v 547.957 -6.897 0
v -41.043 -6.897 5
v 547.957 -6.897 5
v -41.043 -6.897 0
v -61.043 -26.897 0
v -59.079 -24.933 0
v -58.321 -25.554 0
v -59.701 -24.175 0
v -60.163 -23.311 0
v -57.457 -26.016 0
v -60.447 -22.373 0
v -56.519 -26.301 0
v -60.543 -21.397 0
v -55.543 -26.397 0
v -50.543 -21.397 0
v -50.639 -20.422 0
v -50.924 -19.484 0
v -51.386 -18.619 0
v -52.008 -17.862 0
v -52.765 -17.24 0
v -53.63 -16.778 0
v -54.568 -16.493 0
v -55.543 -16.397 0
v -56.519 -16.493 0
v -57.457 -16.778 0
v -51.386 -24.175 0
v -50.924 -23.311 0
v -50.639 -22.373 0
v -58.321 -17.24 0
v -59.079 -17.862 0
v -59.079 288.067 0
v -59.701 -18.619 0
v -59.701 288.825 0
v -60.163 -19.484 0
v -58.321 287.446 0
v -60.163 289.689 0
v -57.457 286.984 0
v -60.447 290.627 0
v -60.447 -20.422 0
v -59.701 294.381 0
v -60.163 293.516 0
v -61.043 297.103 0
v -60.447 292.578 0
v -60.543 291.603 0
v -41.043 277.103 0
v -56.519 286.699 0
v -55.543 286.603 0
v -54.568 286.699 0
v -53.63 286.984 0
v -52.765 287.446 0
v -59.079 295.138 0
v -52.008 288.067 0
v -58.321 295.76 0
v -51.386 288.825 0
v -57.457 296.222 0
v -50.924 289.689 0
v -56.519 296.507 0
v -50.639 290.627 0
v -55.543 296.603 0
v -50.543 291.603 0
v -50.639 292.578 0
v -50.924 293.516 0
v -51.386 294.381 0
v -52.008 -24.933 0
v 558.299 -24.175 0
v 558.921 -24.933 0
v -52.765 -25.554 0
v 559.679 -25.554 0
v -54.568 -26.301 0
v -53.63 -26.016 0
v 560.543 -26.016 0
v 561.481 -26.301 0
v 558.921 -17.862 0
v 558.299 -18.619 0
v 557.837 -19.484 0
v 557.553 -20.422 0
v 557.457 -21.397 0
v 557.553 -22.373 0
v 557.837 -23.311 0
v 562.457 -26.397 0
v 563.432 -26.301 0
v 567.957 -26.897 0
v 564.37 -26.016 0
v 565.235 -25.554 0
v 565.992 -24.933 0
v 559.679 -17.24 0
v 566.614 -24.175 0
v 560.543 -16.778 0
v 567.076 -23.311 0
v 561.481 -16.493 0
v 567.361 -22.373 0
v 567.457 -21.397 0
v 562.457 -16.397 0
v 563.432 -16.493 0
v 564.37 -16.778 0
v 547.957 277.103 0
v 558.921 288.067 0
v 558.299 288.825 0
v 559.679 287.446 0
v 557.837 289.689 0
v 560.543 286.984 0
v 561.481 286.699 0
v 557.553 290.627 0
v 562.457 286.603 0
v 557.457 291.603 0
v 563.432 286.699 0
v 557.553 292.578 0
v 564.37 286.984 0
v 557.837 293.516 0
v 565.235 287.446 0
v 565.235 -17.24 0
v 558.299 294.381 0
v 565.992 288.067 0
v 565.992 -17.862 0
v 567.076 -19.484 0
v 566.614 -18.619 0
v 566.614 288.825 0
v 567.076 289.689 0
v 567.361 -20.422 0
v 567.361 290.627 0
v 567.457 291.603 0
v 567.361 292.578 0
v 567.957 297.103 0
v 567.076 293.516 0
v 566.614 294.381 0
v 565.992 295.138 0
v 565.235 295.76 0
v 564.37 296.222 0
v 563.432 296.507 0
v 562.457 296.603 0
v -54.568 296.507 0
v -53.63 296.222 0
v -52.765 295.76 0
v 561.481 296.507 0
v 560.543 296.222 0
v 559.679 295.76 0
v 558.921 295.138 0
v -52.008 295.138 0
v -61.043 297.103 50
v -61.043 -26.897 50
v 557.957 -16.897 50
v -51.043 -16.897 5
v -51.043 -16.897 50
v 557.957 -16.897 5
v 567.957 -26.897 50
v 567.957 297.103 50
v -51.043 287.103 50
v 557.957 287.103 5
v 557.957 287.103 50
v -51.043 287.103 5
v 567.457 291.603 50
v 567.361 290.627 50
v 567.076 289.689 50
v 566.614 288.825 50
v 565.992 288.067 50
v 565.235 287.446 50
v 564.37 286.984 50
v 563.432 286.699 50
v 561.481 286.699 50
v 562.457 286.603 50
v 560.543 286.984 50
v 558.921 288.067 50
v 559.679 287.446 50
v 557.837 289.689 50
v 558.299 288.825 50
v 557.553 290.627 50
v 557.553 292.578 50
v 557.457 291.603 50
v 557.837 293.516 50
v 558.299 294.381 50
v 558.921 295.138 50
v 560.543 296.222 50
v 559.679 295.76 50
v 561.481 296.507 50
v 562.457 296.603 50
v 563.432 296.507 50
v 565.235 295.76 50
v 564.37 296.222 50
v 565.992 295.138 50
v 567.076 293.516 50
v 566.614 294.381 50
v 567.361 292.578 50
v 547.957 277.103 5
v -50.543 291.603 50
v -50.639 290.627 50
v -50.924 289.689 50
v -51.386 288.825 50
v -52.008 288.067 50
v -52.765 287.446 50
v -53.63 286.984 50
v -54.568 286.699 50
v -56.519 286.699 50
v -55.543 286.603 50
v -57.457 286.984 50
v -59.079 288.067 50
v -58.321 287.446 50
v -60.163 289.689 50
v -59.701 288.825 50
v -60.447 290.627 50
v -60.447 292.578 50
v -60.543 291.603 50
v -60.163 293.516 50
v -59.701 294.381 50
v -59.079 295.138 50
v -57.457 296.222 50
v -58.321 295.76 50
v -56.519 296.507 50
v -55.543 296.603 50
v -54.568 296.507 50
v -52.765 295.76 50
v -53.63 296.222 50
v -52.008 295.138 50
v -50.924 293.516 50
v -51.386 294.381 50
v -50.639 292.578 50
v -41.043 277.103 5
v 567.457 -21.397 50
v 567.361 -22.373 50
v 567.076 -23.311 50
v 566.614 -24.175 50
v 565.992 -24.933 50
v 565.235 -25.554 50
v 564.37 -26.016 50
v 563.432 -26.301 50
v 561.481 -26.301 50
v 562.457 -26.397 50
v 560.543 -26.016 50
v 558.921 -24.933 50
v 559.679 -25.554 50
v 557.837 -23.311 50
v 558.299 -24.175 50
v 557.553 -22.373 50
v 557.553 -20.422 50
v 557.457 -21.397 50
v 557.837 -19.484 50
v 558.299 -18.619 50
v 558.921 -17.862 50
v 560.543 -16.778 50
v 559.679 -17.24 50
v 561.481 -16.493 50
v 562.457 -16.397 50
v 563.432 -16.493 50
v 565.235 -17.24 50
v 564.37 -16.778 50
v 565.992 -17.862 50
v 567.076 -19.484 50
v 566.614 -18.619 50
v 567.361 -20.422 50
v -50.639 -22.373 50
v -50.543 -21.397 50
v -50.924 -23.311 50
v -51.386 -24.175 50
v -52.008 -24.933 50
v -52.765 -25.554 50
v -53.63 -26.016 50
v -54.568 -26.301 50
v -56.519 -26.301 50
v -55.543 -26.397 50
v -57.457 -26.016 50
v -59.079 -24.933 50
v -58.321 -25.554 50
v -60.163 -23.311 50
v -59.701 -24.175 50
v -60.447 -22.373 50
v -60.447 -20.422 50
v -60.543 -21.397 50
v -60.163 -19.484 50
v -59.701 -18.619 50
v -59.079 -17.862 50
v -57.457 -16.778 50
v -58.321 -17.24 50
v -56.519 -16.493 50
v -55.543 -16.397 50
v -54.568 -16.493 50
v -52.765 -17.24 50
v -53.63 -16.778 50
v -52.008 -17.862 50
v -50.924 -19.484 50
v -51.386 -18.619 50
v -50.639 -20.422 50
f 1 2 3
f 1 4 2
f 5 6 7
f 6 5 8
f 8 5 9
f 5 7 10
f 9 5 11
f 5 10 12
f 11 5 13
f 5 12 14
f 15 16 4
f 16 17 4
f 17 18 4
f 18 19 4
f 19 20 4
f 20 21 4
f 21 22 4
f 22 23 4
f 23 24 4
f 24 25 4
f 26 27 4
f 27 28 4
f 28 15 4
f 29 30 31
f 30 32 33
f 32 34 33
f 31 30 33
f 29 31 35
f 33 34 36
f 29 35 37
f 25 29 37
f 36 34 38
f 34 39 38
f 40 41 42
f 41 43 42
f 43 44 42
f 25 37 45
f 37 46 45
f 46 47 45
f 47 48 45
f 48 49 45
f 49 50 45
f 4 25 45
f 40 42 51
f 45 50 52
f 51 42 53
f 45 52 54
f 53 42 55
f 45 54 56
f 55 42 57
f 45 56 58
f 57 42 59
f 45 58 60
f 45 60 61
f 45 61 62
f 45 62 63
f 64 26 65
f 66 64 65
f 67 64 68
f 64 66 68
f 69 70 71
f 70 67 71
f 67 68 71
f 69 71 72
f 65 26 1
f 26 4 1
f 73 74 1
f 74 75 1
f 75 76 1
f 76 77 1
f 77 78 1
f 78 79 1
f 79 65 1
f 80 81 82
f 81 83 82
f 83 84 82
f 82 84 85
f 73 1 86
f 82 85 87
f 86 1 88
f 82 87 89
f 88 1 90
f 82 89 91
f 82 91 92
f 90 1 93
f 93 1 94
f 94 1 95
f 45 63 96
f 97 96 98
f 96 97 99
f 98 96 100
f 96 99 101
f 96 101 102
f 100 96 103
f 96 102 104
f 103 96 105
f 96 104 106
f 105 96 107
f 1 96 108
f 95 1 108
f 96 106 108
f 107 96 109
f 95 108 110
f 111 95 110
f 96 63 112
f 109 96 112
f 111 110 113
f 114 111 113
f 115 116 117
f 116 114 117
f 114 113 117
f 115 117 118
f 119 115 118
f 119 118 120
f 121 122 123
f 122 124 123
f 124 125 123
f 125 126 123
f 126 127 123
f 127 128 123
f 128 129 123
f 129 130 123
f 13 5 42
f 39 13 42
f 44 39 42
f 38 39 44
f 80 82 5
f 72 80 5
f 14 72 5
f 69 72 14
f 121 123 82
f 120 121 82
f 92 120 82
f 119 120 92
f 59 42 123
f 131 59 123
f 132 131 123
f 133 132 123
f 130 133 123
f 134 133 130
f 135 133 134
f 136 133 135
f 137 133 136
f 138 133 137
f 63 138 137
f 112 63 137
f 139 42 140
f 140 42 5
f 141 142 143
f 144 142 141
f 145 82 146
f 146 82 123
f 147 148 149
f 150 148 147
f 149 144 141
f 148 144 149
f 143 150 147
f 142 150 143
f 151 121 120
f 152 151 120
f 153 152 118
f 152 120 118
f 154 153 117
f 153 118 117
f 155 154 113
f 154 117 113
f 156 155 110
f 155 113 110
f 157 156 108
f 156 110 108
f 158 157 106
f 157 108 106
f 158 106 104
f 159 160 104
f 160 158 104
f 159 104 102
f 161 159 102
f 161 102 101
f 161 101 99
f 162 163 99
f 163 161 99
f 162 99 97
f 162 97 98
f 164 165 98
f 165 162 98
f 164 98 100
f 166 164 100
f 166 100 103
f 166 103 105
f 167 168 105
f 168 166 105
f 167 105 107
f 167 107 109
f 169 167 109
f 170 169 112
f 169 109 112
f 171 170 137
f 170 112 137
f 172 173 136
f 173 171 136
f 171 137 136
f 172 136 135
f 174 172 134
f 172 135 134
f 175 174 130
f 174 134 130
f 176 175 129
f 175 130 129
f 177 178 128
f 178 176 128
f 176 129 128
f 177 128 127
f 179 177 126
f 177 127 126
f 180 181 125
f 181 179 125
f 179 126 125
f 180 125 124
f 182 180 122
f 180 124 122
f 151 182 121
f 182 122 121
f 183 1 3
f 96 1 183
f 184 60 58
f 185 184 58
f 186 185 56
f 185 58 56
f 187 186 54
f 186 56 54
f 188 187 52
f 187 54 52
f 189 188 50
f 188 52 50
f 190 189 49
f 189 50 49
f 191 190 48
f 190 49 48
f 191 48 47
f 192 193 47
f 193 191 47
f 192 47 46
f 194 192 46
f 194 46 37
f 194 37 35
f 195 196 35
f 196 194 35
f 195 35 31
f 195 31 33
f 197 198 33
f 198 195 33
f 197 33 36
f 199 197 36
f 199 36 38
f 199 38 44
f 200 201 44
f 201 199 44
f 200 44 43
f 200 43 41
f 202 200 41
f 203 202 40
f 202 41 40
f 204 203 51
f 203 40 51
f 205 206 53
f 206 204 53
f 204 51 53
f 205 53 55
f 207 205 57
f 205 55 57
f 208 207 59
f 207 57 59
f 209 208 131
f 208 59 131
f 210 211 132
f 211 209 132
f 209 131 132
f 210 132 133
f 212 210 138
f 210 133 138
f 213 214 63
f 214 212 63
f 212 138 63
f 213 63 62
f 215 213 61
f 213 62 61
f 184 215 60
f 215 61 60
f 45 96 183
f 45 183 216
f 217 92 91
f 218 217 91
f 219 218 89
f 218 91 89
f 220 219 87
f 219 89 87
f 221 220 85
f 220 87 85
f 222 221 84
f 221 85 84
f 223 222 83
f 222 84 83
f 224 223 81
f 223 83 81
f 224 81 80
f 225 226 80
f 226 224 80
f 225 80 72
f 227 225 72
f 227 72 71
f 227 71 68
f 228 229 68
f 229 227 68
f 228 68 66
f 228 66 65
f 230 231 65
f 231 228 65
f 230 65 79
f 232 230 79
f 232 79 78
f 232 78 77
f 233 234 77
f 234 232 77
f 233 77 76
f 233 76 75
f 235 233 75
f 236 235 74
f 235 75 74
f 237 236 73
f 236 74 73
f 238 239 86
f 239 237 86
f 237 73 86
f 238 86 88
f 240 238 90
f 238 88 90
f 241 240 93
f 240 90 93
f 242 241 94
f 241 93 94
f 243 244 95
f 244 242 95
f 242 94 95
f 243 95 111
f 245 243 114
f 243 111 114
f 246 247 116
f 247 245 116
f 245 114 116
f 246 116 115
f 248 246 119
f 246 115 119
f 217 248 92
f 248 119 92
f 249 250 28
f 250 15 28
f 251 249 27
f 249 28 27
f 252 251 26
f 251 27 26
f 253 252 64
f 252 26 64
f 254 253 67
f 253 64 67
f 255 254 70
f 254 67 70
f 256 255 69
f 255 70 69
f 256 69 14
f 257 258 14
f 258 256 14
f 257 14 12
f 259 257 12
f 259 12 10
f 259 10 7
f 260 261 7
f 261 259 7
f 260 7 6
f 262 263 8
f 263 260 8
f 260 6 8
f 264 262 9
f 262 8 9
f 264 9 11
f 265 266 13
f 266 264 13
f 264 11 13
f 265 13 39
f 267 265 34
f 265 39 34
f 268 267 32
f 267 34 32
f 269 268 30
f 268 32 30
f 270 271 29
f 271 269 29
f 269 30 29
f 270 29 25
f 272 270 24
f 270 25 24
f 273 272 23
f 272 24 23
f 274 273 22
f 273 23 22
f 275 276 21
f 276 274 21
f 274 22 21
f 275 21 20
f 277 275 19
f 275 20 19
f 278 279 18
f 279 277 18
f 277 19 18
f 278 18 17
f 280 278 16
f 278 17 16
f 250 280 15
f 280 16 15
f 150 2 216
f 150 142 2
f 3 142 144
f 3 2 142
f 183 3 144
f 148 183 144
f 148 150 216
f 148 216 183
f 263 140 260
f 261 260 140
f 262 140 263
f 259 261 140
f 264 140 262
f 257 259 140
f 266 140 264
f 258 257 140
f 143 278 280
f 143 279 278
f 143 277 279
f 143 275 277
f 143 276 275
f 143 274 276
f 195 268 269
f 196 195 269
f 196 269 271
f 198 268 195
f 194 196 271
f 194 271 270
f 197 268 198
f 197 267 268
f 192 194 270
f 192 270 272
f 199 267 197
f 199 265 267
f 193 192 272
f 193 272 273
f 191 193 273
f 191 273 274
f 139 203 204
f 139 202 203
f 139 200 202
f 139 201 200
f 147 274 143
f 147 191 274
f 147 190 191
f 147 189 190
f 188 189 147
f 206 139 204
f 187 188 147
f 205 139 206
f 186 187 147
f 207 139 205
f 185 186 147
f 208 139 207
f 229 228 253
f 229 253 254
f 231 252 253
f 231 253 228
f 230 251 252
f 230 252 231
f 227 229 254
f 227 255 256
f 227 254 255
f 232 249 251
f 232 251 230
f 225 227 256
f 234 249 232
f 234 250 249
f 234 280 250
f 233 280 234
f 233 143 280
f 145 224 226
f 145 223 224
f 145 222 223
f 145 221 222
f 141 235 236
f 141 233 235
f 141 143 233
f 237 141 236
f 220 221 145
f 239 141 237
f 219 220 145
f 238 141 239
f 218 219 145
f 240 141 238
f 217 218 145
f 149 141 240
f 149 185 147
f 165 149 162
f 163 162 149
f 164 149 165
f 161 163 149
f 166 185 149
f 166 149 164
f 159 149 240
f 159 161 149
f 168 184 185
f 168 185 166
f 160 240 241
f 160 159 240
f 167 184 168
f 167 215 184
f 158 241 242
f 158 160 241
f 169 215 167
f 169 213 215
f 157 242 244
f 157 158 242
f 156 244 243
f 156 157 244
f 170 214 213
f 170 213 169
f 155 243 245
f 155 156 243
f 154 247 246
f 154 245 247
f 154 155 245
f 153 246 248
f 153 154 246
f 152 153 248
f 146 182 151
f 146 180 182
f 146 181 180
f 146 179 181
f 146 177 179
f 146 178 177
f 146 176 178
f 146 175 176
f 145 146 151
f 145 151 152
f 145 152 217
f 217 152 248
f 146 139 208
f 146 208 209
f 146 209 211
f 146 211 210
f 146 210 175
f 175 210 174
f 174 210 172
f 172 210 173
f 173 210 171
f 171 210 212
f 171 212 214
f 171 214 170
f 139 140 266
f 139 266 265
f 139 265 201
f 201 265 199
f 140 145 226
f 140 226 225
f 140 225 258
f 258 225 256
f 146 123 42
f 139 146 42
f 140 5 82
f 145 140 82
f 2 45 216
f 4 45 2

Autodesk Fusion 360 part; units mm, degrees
sketch "Sketch1" plane through (0, 0, 0) normal (0, 0, 1) x (1, 0, 0)
  line L0 (-51.0433, -16.8971) -> (557.9567, -16.8971)
  line L1 (557.9567, -16.8971) -> (557.9567, 287.1029)
  line L2 (557.9567, 287.1029) -> (-51.0433, 287.1029)
  line L3 (-51.0433, 287.1029) -> (-51.0433, -16.8971)
  line L4 (-41.0433, -6.8971) -> (547.9567, -6.8971)
  line L5 (547.9567, -6.8971) -> (547.9567, 277.1029)
  line L6 (547.9567, 277.1029) -> (-41.0433, 277.1029)
  line L7 (-41.0433, 277.1029) -> (-41.0433, -6.8971)
  line L8 (-61.0433, -26.8971) -> (567.9567, -26.8971)
  line L9 (567.9567, -26.8971) -> (567.9567, 297.1029)
  line L10 (567.9567, 297.1029) -> (-61.0433, 297.1029)
  line L11 (-61.0433, 297.1029) -> (-61.0433, -26.8971)
  circle A0 centre (-55.5433, -21.3971) radius 5
  circle A1 centre (-55.5433, 291.6029) radius 5
  circle A2 centre (562.4567, 291.6029) radius 5
  circle A3 centre (562.4567, -21.3971) radius 5
  dimension "d1" = 609
  dimension "d2" = 304
  dimension "d3" = 10
  dimension "d4" = 10
  dimension "d5" = 10
  dimension "d6" = 10
  dimension "d7" = 10
  dimension "d8" = 10
  dimension "d9" = 10
  dimension "d10" = 10
  dimension "d11" = 10
  dimension "d12" = 5.5
  dimension "d13" = 5.5
  dimension "d14" = 10
  dimension "d15" = 5.5
  dimension "d16" = 5.5
  dimension "d17" = 10
  dimension "d18" = 5.5
  dimension "d19" = 5.5
  dimension "d20" = 10
  dimension "d21" = 5.5
  dimension "d22" = 5.5
extrude "Extrude1" add sketch "Sketch1" along normal blind 5 contours L0 L1 L2 L3
extrude "Extrude2" add sketch "Sketch1" along normal blind 50 contours L8 L9 L10 L11
